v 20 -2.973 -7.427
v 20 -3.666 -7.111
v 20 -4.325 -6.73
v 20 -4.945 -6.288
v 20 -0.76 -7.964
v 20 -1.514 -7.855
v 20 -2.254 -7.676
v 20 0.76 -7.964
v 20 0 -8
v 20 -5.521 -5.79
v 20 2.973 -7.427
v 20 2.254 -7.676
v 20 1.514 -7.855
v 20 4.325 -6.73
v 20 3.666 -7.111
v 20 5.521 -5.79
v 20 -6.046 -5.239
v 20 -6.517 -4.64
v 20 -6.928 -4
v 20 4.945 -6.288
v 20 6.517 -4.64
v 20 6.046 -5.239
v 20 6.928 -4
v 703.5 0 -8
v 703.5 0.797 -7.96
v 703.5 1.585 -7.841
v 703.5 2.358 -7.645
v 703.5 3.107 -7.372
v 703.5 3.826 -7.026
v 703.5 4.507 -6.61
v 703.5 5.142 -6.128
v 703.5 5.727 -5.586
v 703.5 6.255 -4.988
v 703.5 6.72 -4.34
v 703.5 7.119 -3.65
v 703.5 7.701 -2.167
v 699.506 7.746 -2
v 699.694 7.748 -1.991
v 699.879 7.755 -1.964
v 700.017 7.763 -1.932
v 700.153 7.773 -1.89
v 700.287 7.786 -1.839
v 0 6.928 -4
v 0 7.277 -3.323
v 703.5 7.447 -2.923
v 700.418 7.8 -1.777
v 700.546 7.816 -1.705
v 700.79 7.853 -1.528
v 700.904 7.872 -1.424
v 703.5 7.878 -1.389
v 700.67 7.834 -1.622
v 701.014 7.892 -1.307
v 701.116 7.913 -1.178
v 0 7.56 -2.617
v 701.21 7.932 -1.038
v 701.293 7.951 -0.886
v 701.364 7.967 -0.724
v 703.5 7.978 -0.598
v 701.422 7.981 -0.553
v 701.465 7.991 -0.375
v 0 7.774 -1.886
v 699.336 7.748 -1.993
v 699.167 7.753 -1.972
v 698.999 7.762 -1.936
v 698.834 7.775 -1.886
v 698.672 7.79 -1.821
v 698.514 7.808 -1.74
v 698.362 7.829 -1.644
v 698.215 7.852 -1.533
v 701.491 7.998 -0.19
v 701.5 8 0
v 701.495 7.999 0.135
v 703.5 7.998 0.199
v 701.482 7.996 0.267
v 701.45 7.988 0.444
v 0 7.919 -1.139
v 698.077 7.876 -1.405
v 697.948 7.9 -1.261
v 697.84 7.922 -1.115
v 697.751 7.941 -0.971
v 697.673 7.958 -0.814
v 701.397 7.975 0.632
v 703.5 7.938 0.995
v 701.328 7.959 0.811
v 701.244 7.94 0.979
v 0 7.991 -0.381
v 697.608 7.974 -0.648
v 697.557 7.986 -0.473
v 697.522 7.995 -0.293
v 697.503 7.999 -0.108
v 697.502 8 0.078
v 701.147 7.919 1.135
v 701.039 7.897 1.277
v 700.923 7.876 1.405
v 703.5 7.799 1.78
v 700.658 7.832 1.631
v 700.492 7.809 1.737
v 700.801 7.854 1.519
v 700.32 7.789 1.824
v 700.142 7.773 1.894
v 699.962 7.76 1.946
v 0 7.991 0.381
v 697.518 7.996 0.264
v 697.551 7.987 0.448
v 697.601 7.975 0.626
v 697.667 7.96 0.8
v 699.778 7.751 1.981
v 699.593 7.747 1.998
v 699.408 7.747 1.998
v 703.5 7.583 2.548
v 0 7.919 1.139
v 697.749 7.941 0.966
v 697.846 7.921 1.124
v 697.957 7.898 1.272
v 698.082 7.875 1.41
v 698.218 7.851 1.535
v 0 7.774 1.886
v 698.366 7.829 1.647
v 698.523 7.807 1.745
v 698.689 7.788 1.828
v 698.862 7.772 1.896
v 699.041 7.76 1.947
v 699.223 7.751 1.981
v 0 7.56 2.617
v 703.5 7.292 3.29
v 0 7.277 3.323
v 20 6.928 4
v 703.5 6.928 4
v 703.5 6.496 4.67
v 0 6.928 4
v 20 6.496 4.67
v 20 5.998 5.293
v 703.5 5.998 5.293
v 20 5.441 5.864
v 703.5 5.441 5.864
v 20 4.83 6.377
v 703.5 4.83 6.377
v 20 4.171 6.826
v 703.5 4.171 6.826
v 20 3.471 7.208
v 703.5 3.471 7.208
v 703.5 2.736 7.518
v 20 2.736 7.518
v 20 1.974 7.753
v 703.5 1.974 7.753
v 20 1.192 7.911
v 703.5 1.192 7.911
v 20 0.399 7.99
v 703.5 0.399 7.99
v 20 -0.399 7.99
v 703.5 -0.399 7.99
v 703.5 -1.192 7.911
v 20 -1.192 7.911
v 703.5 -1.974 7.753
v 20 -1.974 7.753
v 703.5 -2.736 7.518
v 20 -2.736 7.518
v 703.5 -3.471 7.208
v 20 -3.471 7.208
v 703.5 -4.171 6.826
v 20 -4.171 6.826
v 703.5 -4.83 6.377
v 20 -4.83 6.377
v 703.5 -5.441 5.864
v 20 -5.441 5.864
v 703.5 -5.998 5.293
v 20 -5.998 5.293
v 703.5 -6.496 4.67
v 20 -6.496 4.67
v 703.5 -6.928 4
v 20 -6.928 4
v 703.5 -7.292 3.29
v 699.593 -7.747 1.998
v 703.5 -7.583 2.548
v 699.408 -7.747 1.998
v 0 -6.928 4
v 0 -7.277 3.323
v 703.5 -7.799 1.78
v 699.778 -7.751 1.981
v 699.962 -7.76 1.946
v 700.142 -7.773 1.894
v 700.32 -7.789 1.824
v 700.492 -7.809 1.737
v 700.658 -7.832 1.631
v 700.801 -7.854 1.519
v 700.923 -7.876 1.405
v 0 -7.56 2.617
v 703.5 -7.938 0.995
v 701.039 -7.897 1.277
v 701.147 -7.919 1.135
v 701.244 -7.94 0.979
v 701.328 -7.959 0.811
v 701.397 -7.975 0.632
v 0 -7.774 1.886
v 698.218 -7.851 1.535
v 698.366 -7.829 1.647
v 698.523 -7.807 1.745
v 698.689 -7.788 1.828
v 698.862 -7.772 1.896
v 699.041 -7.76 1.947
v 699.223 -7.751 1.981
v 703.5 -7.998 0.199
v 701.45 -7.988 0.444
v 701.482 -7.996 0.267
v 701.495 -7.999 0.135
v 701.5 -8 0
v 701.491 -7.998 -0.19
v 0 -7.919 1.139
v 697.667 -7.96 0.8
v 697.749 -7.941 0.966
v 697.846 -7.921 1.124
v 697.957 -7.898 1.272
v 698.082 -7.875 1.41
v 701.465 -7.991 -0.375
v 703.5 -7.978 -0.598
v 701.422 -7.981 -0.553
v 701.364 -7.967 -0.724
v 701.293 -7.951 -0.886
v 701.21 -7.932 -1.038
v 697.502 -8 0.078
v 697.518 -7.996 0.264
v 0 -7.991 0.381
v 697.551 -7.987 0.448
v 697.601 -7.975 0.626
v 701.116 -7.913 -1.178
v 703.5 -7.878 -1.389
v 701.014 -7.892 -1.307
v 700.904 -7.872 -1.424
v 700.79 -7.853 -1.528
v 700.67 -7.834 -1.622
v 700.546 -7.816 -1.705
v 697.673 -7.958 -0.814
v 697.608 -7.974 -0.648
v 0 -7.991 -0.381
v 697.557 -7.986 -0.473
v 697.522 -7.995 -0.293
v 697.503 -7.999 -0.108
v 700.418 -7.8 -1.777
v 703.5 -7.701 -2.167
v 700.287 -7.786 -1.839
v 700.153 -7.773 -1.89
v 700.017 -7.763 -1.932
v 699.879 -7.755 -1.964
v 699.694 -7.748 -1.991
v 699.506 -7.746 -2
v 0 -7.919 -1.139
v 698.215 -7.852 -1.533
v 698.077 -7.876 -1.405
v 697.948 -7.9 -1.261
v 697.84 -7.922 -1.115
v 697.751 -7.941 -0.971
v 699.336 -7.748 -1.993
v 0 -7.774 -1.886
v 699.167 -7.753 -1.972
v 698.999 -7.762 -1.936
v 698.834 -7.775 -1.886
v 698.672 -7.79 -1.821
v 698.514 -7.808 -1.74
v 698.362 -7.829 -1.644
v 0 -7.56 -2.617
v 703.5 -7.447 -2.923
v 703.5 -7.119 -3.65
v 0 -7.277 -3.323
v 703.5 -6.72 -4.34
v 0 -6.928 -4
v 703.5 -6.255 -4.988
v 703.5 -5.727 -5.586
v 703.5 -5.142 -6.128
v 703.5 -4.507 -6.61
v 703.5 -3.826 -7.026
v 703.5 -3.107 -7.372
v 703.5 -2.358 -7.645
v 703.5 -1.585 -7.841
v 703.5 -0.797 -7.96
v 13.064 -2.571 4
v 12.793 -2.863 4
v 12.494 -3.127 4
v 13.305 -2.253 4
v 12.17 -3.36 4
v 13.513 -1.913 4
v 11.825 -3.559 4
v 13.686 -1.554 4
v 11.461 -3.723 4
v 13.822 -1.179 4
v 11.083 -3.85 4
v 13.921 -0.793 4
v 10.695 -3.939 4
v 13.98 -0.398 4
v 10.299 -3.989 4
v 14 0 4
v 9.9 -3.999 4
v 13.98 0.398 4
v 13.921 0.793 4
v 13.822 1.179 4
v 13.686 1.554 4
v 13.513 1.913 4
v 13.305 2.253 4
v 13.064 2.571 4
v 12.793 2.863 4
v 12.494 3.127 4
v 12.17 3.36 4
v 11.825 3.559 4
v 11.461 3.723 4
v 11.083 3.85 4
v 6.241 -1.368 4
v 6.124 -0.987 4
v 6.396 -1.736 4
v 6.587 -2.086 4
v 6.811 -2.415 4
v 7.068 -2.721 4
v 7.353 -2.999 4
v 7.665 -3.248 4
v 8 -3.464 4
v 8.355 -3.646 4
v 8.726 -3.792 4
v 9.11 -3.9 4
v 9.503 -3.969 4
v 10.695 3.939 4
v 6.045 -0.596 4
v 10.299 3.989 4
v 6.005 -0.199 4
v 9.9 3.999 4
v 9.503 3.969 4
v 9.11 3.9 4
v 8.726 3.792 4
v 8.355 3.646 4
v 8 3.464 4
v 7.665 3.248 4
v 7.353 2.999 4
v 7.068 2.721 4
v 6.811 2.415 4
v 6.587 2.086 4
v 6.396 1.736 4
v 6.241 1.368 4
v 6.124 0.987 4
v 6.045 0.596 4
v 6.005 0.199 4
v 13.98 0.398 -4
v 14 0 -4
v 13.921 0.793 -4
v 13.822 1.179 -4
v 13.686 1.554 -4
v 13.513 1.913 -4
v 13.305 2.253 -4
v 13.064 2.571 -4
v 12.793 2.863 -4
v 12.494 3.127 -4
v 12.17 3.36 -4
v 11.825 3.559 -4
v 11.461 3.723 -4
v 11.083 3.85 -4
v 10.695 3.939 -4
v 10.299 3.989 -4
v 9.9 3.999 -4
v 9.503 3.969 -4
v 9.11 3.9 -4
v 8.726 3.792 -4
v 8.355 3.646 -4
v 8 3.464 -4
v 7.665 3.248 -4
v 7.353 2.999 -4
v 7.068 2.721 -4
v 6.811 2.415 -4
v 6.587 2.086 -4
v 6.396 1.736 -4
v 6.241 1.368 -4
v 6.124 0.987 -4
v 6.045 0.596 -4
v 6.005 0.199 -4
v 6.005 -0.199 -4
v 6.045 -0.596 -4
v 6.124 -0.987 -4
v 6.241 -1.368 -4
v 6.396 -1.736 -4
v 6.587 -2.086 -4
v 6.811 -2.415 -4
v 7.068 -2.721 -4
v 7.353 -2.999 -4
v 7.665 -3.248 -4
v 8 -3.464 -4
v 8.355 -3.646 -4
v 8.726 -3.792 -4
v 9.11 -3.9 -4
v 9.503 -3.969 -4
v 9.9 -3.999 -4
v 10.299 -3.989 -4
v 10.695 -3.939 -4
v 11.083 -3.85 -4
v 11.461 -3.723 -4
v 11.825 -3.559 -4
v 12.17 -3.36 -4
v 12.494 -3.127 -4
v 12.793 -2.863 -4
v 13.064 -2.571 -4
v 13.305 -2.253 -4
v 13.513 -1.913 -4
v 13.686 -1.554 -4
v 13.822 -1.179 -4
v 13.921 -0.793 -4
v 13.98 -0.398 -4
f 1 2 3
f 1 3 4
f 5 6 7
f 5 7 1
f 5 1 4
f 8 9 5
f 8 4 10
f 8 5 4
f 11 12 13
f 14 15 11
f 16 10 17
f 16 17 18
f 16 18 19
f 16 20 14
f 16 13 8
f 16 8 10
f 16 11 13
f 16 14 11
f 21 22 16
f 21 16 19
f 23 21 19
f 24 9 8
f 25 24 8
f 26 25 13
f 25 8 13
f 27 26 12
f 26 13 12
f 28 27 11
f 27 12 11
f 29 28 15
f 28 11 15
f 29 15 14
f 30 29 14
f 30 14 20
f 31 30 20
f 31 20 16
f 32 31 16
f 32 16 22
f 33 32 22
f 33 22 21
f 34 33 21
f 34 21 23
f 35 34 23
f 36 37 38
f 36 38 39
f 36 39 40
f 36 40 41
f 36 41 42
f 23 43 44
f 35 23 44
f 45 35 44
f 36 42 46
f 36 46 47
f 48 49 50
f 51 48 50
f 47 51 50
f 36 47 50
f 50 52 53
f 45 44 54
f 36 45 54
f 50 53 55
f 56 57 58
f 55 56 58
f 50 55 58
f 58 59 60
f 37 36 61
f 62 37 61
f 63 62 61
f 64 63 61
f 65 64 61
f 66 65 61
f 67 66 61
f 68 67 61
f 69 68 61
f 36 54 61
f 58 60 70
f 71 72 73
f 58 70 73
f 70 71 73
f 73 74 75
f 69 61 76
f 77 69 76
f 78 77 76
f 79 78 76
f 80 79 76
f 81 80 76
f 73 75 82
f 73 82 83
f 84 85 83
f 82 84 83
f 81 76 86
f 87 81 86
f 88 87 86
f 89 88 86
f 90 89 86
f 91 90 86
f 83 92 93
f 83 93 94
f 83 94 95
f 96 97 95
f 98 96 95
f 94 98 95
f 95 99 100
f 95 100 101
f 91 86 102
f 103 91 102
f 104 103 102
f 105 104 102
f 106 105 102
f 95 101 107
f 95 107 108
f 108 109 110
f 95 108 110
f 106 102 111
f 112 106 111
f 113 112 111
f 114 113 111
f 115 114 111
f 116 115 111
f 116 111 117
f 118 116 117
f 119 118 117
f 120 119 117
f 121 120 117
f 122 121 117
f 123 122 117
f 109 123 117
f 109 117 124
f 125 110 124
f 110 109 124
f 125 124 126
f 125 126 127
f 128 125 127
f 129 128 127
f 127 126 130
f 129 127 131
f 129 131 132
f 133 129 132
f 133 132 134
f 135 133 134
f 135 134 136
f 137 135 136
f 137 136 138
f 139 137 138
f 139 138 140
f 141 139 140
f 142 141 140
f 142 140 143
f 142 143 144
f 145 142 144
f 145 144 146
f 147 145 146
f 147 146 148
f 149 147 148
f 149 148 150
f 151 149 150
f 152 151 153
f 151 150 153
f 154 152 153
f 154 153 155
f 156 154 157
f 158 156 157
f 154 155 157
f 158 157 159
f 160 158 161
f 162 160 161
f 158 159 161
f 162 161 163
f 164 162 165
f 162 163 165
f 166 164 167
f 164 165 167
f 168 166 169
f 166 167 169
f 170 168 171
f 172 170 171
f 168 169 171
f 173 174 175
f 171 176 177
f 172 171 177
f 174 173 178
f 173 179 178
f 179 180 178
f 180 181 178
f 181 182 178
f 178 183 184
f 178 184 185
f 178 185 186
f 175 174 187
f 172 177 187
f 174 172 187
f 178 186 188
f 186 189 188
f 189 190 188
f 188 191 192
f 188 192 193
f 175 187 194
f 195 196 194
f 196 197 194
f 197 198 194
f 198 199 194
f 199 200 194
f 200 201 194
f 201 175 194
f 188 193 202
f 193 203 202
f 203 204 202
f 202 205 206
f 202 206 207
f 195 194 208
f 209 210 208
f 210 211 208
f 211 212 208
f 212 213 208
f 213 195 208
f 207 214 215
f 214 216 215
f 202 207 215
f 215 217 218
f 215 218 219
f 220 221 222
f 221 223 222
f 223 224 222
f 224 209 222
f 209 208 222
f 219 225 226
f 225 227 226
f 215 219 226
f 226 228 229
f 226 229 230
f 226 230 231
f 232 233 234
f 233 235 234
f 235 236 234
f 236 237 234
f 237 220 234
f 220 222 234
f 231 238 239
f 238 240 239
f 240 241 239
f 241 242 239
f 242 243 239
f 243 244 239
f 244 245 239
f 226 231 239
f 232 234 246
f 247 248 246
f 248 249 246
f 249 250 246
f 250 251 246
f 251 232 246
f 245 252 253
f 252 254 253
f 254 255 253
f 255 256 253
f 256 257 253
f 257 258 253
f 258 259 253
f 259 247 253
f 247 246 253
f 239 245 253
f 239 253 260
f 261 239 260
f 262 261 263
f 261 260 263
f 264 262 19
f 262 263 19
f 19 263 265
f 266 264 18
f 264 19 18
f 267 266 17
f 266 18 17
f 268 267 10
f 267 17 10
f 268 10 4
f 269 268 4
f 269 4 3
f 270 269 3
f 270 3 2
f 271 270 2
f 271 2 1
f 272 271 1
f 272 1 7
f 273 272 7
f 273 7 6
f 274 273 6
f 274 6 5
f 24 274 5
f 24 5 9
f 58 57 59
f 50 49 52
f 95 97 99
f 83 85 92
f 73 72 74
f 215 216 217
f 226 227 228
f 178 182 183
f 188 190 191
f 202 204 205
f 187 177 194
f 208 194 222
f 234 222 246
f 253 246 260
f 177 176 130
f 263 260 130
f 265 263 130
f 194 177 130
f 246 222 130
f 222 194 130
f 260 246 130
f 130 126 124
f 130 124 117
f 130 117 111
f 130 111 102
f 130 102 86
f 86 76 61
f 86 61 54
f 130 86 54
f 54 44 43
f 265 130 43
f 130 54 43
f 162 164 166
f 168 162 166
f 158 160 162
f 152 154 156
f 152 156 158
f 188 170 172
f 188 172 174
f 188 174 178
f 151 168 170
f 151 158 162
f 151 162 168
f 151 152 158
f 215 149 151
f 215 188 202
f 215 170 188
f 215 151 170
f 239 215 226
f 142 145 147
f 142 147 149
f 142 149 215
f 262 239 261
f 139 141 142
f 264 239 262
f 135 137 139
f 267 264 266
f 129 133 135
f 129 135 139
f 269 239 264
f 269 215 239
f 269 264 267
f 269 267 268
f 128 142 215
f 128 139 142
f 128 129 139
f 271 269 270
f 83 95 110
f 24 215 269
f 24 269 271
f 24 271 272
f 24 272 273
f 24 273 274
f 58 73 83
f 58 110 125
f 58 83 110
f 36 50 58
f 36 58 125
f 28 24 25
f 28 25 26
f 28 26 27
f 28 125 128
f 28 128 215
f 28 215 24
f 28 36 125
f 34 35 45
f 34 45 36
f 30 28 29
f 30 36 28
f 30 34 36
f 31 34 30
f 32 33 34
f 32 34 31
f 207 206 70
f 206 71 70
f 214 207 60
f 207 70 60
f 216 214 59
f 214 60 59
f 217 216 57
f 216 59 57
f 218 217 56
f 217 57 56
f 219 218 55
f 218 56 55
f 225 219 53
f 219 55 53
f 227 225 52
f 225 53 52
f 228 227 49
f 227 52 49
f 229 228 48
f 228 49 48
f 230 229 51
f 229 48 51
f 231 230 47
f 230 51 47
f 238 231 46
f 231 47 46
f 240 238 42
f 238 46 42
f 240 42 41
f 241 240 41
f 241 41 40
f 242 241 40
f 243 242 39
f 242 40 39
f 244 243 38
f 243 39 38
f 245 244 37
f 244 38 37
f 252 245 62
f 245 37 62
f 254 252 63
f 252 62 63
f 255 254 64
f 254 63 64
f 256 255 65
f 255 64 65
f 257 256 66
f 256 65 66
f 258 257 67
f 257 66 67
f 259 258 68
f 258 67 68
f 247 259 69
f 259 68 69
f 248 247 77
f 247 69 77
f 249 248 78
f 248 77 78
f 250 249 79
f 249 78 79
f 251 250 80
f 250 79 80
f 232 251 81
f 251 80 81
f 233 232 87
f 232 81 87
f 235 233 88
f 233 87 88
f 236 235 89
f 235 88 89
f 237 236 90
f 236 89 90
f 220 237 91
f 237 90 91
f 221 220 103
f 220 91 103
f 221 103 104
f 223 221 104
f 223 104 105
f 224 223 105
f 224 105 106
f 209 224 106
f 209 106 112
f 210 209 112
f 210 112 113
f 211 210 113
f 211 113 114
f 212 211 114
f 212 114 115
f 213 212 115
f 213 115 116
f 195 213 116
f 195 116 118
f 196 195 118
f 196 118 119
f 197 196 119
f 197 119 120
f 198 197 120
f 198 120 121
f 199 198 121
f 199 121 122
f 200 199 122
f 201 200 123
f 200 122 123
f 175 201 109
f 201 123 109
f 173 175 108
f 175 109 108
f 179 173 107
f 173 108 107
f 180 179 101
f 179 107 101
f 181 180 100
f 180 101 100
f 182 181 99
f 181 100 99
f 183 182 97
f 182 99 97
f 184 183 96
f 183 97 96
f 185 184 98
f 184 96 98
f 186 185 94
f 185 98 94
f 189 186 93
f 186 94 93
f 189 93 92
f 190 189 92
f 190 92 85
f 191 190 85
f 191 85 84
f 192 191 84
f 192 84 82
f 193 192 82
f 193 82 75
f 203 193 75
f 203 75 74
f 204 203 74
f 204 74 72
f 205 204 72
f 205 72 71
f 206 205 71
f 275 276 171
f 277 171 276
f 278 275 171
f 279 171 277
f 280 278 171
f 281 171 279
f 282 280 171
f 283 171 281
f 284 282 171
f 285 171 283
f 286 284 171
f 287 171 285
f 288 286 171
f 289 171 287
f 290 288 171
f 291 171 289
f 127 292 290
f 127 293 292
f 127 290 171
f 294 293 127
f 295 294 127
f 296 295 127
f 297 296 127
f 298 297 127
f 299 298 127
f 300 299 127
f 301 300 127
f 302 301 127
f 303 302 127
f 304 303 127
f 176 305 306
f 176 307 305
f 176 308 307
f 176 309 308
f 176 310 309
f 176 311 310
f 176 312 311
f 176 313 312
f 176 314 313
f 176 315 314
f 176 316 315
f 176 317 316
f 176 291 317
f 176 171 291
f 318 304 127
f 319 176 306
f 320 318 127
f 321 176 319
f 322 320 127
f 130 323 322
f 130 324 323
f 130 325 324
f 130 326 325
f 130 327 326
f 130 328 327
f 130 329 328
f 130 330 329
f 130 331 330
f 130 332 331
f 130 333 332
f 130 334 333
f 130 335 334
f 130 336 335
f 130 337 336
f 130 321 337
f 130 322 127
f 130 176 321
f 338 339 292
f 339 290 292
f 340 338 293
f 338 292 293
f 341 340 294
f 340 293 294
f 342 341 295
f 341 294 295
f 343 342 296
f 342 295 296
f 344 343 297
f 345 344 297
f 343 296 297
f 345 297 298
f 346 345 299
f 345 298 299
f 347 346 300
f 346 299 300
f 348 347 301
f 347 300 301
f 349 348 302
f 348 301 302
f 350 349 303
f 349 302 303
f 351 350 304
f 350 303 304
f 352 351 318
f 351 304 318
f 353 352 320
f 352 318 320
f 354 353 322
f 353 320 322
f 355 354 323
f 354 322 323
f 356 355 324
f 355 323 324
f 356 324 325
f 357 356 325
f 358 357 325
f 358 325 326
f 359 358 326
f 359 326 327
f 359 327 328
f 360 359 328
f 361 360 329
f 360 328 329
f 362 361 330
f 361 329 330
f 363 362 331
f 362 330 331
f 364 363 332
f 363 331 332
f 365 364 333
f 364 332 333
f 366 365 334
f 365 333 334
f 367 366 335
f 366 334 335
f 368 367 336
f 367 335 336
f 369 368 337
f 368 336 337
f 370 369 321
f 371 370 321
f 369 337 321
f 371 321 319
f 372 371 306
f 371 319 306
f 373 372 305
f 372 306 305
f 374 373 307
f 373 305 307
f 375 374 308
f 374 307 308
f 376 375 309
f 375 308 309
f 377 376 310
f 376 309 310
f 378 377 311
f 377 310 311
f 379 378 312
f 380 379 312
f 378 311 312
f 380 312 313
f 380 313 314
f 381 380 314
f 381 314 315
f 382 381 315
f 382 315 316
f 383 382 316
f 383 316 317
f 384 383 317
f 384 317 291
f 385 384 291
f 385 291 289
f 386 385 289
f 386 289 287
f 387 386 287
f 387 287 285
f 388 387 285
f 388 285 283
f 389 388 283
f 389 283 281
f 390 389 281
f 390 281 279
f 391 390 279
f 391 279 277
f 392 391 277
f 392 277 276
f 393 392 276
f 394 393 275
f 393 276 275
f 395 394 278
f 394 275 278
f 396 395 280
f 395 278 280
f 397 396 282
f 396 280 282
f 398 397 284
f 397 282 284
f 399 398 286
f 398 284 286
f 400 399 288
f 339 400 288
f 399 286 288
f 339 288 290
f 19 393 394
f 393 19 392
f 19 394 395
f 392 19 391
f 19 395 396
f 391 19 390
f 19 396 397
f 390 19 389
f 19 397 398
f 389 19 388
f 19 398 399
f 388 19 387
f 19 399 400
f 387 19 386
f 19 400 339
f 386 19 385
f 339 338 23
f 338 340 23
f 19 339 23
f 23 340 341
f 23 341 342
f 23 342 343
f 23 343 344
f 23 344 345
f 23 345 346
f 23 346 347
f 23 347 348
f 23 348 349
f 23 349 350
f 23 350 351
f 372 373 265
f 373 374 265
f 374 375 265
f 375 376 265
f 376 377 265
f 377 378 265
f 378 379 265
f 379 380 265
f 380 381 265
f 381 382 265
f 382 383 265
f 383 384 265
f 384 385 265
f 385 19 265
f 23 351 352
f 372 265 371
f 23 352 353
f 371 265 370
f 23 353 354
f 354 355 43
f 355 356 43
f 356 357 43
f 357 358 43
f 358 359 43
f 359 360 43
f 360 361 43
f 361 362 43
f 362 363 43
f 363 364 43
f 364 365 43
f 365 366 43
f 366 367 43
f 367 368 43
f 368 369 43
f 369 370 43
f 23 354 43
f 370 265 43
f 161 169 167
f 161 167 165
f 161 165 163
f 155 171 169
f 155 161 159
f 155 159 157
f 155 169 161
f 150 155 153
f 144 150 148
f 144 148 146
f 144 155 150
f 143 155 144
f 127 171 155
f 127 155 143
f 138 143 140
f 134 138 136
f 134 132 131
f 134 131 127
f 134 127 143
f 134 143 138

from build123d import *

# Parameters (mm, degrees)
SKETCH_1_R               = 8
EXTRUDE_1_DEPTH          = 703.5
SKETCH_2_R               = 4
CUT_EXTRUDE_1_DEPTH      = 9
CUT_EXTRUDE_1_DEPTH_BACK = 9
SKETCH_3_OUTSIDE_W       = 158.772
SKETCH_3_OUTSIDE_H       = 158.772
SKETCH_3_OUTSIDE_W_2     = 8
SKETCH_3_OUTSIDE_H_2     = 20
CUT_EXTRUDE_2_DEPTH      = 20
SKETCH_4_R               = 2
CUT_EXTRUDE_3_DEPTH      = 25


with BuildPart() as part:
    # 草图1 → 凸台-拉伸1 (new body)
    with BuildSketch(Plane(origin=(0, 0, 0), x_dir=(0, 0, -1), z_dir=(1, 0, 0))):
        Circle(SKETCH_1_R)
    extrude(amount=EXTRUDE_1_DEPTH)

    # 草图2 → 切除-拉伸1 (cut, two sides)
    with BuildSketch(Plane.XY) as cut_extrude_1_sk:
        with Locations((10, 0)):
            Circle(SKETCH_2_R)
    extrude(amount=CUT_EXTRUDE_1_DEPTH, mode=Mode.SUBTRACT)
    extrude(cut_extrude_1_sk.sketch, amount=-CUT_EXTRUDE_1_DEPTH_BACK, mode=Mode.SUBTRACT)

    # 草图3 outside → 切除-拉伸2 (cut)
    with BuildSketch(Plane.ZY):
        Rectangle(SKETCH_3_OUTSIDE_W, SKETCH_3_OUTSIDE_H)
        Rectangle(SKETCH_3_OUTSIDE_W_2, SKETCH_3_OUTSIDE_H_2, mode=Mode.SUBTRACT)
    extrude(amount=-CUT_EXTRUDE_2_DEPTH, mode=Mode.SUBTRACT)

    # 草图4 → 切除-拉伸3 (cut, symmetric)
    with BuildSketch(Plane(origin=(0, 0, 0), x_dir=(1, 0, 0), z_dir=(0, 1, 0))):
        with Locations((699.5, 0)):
            Circle(SKETCH_4_R)
    extrude(amount=CUT_EXTRUDE_3_DEPTH, both=True, mode=Mode.SUBTRACT)


solid = part.part
